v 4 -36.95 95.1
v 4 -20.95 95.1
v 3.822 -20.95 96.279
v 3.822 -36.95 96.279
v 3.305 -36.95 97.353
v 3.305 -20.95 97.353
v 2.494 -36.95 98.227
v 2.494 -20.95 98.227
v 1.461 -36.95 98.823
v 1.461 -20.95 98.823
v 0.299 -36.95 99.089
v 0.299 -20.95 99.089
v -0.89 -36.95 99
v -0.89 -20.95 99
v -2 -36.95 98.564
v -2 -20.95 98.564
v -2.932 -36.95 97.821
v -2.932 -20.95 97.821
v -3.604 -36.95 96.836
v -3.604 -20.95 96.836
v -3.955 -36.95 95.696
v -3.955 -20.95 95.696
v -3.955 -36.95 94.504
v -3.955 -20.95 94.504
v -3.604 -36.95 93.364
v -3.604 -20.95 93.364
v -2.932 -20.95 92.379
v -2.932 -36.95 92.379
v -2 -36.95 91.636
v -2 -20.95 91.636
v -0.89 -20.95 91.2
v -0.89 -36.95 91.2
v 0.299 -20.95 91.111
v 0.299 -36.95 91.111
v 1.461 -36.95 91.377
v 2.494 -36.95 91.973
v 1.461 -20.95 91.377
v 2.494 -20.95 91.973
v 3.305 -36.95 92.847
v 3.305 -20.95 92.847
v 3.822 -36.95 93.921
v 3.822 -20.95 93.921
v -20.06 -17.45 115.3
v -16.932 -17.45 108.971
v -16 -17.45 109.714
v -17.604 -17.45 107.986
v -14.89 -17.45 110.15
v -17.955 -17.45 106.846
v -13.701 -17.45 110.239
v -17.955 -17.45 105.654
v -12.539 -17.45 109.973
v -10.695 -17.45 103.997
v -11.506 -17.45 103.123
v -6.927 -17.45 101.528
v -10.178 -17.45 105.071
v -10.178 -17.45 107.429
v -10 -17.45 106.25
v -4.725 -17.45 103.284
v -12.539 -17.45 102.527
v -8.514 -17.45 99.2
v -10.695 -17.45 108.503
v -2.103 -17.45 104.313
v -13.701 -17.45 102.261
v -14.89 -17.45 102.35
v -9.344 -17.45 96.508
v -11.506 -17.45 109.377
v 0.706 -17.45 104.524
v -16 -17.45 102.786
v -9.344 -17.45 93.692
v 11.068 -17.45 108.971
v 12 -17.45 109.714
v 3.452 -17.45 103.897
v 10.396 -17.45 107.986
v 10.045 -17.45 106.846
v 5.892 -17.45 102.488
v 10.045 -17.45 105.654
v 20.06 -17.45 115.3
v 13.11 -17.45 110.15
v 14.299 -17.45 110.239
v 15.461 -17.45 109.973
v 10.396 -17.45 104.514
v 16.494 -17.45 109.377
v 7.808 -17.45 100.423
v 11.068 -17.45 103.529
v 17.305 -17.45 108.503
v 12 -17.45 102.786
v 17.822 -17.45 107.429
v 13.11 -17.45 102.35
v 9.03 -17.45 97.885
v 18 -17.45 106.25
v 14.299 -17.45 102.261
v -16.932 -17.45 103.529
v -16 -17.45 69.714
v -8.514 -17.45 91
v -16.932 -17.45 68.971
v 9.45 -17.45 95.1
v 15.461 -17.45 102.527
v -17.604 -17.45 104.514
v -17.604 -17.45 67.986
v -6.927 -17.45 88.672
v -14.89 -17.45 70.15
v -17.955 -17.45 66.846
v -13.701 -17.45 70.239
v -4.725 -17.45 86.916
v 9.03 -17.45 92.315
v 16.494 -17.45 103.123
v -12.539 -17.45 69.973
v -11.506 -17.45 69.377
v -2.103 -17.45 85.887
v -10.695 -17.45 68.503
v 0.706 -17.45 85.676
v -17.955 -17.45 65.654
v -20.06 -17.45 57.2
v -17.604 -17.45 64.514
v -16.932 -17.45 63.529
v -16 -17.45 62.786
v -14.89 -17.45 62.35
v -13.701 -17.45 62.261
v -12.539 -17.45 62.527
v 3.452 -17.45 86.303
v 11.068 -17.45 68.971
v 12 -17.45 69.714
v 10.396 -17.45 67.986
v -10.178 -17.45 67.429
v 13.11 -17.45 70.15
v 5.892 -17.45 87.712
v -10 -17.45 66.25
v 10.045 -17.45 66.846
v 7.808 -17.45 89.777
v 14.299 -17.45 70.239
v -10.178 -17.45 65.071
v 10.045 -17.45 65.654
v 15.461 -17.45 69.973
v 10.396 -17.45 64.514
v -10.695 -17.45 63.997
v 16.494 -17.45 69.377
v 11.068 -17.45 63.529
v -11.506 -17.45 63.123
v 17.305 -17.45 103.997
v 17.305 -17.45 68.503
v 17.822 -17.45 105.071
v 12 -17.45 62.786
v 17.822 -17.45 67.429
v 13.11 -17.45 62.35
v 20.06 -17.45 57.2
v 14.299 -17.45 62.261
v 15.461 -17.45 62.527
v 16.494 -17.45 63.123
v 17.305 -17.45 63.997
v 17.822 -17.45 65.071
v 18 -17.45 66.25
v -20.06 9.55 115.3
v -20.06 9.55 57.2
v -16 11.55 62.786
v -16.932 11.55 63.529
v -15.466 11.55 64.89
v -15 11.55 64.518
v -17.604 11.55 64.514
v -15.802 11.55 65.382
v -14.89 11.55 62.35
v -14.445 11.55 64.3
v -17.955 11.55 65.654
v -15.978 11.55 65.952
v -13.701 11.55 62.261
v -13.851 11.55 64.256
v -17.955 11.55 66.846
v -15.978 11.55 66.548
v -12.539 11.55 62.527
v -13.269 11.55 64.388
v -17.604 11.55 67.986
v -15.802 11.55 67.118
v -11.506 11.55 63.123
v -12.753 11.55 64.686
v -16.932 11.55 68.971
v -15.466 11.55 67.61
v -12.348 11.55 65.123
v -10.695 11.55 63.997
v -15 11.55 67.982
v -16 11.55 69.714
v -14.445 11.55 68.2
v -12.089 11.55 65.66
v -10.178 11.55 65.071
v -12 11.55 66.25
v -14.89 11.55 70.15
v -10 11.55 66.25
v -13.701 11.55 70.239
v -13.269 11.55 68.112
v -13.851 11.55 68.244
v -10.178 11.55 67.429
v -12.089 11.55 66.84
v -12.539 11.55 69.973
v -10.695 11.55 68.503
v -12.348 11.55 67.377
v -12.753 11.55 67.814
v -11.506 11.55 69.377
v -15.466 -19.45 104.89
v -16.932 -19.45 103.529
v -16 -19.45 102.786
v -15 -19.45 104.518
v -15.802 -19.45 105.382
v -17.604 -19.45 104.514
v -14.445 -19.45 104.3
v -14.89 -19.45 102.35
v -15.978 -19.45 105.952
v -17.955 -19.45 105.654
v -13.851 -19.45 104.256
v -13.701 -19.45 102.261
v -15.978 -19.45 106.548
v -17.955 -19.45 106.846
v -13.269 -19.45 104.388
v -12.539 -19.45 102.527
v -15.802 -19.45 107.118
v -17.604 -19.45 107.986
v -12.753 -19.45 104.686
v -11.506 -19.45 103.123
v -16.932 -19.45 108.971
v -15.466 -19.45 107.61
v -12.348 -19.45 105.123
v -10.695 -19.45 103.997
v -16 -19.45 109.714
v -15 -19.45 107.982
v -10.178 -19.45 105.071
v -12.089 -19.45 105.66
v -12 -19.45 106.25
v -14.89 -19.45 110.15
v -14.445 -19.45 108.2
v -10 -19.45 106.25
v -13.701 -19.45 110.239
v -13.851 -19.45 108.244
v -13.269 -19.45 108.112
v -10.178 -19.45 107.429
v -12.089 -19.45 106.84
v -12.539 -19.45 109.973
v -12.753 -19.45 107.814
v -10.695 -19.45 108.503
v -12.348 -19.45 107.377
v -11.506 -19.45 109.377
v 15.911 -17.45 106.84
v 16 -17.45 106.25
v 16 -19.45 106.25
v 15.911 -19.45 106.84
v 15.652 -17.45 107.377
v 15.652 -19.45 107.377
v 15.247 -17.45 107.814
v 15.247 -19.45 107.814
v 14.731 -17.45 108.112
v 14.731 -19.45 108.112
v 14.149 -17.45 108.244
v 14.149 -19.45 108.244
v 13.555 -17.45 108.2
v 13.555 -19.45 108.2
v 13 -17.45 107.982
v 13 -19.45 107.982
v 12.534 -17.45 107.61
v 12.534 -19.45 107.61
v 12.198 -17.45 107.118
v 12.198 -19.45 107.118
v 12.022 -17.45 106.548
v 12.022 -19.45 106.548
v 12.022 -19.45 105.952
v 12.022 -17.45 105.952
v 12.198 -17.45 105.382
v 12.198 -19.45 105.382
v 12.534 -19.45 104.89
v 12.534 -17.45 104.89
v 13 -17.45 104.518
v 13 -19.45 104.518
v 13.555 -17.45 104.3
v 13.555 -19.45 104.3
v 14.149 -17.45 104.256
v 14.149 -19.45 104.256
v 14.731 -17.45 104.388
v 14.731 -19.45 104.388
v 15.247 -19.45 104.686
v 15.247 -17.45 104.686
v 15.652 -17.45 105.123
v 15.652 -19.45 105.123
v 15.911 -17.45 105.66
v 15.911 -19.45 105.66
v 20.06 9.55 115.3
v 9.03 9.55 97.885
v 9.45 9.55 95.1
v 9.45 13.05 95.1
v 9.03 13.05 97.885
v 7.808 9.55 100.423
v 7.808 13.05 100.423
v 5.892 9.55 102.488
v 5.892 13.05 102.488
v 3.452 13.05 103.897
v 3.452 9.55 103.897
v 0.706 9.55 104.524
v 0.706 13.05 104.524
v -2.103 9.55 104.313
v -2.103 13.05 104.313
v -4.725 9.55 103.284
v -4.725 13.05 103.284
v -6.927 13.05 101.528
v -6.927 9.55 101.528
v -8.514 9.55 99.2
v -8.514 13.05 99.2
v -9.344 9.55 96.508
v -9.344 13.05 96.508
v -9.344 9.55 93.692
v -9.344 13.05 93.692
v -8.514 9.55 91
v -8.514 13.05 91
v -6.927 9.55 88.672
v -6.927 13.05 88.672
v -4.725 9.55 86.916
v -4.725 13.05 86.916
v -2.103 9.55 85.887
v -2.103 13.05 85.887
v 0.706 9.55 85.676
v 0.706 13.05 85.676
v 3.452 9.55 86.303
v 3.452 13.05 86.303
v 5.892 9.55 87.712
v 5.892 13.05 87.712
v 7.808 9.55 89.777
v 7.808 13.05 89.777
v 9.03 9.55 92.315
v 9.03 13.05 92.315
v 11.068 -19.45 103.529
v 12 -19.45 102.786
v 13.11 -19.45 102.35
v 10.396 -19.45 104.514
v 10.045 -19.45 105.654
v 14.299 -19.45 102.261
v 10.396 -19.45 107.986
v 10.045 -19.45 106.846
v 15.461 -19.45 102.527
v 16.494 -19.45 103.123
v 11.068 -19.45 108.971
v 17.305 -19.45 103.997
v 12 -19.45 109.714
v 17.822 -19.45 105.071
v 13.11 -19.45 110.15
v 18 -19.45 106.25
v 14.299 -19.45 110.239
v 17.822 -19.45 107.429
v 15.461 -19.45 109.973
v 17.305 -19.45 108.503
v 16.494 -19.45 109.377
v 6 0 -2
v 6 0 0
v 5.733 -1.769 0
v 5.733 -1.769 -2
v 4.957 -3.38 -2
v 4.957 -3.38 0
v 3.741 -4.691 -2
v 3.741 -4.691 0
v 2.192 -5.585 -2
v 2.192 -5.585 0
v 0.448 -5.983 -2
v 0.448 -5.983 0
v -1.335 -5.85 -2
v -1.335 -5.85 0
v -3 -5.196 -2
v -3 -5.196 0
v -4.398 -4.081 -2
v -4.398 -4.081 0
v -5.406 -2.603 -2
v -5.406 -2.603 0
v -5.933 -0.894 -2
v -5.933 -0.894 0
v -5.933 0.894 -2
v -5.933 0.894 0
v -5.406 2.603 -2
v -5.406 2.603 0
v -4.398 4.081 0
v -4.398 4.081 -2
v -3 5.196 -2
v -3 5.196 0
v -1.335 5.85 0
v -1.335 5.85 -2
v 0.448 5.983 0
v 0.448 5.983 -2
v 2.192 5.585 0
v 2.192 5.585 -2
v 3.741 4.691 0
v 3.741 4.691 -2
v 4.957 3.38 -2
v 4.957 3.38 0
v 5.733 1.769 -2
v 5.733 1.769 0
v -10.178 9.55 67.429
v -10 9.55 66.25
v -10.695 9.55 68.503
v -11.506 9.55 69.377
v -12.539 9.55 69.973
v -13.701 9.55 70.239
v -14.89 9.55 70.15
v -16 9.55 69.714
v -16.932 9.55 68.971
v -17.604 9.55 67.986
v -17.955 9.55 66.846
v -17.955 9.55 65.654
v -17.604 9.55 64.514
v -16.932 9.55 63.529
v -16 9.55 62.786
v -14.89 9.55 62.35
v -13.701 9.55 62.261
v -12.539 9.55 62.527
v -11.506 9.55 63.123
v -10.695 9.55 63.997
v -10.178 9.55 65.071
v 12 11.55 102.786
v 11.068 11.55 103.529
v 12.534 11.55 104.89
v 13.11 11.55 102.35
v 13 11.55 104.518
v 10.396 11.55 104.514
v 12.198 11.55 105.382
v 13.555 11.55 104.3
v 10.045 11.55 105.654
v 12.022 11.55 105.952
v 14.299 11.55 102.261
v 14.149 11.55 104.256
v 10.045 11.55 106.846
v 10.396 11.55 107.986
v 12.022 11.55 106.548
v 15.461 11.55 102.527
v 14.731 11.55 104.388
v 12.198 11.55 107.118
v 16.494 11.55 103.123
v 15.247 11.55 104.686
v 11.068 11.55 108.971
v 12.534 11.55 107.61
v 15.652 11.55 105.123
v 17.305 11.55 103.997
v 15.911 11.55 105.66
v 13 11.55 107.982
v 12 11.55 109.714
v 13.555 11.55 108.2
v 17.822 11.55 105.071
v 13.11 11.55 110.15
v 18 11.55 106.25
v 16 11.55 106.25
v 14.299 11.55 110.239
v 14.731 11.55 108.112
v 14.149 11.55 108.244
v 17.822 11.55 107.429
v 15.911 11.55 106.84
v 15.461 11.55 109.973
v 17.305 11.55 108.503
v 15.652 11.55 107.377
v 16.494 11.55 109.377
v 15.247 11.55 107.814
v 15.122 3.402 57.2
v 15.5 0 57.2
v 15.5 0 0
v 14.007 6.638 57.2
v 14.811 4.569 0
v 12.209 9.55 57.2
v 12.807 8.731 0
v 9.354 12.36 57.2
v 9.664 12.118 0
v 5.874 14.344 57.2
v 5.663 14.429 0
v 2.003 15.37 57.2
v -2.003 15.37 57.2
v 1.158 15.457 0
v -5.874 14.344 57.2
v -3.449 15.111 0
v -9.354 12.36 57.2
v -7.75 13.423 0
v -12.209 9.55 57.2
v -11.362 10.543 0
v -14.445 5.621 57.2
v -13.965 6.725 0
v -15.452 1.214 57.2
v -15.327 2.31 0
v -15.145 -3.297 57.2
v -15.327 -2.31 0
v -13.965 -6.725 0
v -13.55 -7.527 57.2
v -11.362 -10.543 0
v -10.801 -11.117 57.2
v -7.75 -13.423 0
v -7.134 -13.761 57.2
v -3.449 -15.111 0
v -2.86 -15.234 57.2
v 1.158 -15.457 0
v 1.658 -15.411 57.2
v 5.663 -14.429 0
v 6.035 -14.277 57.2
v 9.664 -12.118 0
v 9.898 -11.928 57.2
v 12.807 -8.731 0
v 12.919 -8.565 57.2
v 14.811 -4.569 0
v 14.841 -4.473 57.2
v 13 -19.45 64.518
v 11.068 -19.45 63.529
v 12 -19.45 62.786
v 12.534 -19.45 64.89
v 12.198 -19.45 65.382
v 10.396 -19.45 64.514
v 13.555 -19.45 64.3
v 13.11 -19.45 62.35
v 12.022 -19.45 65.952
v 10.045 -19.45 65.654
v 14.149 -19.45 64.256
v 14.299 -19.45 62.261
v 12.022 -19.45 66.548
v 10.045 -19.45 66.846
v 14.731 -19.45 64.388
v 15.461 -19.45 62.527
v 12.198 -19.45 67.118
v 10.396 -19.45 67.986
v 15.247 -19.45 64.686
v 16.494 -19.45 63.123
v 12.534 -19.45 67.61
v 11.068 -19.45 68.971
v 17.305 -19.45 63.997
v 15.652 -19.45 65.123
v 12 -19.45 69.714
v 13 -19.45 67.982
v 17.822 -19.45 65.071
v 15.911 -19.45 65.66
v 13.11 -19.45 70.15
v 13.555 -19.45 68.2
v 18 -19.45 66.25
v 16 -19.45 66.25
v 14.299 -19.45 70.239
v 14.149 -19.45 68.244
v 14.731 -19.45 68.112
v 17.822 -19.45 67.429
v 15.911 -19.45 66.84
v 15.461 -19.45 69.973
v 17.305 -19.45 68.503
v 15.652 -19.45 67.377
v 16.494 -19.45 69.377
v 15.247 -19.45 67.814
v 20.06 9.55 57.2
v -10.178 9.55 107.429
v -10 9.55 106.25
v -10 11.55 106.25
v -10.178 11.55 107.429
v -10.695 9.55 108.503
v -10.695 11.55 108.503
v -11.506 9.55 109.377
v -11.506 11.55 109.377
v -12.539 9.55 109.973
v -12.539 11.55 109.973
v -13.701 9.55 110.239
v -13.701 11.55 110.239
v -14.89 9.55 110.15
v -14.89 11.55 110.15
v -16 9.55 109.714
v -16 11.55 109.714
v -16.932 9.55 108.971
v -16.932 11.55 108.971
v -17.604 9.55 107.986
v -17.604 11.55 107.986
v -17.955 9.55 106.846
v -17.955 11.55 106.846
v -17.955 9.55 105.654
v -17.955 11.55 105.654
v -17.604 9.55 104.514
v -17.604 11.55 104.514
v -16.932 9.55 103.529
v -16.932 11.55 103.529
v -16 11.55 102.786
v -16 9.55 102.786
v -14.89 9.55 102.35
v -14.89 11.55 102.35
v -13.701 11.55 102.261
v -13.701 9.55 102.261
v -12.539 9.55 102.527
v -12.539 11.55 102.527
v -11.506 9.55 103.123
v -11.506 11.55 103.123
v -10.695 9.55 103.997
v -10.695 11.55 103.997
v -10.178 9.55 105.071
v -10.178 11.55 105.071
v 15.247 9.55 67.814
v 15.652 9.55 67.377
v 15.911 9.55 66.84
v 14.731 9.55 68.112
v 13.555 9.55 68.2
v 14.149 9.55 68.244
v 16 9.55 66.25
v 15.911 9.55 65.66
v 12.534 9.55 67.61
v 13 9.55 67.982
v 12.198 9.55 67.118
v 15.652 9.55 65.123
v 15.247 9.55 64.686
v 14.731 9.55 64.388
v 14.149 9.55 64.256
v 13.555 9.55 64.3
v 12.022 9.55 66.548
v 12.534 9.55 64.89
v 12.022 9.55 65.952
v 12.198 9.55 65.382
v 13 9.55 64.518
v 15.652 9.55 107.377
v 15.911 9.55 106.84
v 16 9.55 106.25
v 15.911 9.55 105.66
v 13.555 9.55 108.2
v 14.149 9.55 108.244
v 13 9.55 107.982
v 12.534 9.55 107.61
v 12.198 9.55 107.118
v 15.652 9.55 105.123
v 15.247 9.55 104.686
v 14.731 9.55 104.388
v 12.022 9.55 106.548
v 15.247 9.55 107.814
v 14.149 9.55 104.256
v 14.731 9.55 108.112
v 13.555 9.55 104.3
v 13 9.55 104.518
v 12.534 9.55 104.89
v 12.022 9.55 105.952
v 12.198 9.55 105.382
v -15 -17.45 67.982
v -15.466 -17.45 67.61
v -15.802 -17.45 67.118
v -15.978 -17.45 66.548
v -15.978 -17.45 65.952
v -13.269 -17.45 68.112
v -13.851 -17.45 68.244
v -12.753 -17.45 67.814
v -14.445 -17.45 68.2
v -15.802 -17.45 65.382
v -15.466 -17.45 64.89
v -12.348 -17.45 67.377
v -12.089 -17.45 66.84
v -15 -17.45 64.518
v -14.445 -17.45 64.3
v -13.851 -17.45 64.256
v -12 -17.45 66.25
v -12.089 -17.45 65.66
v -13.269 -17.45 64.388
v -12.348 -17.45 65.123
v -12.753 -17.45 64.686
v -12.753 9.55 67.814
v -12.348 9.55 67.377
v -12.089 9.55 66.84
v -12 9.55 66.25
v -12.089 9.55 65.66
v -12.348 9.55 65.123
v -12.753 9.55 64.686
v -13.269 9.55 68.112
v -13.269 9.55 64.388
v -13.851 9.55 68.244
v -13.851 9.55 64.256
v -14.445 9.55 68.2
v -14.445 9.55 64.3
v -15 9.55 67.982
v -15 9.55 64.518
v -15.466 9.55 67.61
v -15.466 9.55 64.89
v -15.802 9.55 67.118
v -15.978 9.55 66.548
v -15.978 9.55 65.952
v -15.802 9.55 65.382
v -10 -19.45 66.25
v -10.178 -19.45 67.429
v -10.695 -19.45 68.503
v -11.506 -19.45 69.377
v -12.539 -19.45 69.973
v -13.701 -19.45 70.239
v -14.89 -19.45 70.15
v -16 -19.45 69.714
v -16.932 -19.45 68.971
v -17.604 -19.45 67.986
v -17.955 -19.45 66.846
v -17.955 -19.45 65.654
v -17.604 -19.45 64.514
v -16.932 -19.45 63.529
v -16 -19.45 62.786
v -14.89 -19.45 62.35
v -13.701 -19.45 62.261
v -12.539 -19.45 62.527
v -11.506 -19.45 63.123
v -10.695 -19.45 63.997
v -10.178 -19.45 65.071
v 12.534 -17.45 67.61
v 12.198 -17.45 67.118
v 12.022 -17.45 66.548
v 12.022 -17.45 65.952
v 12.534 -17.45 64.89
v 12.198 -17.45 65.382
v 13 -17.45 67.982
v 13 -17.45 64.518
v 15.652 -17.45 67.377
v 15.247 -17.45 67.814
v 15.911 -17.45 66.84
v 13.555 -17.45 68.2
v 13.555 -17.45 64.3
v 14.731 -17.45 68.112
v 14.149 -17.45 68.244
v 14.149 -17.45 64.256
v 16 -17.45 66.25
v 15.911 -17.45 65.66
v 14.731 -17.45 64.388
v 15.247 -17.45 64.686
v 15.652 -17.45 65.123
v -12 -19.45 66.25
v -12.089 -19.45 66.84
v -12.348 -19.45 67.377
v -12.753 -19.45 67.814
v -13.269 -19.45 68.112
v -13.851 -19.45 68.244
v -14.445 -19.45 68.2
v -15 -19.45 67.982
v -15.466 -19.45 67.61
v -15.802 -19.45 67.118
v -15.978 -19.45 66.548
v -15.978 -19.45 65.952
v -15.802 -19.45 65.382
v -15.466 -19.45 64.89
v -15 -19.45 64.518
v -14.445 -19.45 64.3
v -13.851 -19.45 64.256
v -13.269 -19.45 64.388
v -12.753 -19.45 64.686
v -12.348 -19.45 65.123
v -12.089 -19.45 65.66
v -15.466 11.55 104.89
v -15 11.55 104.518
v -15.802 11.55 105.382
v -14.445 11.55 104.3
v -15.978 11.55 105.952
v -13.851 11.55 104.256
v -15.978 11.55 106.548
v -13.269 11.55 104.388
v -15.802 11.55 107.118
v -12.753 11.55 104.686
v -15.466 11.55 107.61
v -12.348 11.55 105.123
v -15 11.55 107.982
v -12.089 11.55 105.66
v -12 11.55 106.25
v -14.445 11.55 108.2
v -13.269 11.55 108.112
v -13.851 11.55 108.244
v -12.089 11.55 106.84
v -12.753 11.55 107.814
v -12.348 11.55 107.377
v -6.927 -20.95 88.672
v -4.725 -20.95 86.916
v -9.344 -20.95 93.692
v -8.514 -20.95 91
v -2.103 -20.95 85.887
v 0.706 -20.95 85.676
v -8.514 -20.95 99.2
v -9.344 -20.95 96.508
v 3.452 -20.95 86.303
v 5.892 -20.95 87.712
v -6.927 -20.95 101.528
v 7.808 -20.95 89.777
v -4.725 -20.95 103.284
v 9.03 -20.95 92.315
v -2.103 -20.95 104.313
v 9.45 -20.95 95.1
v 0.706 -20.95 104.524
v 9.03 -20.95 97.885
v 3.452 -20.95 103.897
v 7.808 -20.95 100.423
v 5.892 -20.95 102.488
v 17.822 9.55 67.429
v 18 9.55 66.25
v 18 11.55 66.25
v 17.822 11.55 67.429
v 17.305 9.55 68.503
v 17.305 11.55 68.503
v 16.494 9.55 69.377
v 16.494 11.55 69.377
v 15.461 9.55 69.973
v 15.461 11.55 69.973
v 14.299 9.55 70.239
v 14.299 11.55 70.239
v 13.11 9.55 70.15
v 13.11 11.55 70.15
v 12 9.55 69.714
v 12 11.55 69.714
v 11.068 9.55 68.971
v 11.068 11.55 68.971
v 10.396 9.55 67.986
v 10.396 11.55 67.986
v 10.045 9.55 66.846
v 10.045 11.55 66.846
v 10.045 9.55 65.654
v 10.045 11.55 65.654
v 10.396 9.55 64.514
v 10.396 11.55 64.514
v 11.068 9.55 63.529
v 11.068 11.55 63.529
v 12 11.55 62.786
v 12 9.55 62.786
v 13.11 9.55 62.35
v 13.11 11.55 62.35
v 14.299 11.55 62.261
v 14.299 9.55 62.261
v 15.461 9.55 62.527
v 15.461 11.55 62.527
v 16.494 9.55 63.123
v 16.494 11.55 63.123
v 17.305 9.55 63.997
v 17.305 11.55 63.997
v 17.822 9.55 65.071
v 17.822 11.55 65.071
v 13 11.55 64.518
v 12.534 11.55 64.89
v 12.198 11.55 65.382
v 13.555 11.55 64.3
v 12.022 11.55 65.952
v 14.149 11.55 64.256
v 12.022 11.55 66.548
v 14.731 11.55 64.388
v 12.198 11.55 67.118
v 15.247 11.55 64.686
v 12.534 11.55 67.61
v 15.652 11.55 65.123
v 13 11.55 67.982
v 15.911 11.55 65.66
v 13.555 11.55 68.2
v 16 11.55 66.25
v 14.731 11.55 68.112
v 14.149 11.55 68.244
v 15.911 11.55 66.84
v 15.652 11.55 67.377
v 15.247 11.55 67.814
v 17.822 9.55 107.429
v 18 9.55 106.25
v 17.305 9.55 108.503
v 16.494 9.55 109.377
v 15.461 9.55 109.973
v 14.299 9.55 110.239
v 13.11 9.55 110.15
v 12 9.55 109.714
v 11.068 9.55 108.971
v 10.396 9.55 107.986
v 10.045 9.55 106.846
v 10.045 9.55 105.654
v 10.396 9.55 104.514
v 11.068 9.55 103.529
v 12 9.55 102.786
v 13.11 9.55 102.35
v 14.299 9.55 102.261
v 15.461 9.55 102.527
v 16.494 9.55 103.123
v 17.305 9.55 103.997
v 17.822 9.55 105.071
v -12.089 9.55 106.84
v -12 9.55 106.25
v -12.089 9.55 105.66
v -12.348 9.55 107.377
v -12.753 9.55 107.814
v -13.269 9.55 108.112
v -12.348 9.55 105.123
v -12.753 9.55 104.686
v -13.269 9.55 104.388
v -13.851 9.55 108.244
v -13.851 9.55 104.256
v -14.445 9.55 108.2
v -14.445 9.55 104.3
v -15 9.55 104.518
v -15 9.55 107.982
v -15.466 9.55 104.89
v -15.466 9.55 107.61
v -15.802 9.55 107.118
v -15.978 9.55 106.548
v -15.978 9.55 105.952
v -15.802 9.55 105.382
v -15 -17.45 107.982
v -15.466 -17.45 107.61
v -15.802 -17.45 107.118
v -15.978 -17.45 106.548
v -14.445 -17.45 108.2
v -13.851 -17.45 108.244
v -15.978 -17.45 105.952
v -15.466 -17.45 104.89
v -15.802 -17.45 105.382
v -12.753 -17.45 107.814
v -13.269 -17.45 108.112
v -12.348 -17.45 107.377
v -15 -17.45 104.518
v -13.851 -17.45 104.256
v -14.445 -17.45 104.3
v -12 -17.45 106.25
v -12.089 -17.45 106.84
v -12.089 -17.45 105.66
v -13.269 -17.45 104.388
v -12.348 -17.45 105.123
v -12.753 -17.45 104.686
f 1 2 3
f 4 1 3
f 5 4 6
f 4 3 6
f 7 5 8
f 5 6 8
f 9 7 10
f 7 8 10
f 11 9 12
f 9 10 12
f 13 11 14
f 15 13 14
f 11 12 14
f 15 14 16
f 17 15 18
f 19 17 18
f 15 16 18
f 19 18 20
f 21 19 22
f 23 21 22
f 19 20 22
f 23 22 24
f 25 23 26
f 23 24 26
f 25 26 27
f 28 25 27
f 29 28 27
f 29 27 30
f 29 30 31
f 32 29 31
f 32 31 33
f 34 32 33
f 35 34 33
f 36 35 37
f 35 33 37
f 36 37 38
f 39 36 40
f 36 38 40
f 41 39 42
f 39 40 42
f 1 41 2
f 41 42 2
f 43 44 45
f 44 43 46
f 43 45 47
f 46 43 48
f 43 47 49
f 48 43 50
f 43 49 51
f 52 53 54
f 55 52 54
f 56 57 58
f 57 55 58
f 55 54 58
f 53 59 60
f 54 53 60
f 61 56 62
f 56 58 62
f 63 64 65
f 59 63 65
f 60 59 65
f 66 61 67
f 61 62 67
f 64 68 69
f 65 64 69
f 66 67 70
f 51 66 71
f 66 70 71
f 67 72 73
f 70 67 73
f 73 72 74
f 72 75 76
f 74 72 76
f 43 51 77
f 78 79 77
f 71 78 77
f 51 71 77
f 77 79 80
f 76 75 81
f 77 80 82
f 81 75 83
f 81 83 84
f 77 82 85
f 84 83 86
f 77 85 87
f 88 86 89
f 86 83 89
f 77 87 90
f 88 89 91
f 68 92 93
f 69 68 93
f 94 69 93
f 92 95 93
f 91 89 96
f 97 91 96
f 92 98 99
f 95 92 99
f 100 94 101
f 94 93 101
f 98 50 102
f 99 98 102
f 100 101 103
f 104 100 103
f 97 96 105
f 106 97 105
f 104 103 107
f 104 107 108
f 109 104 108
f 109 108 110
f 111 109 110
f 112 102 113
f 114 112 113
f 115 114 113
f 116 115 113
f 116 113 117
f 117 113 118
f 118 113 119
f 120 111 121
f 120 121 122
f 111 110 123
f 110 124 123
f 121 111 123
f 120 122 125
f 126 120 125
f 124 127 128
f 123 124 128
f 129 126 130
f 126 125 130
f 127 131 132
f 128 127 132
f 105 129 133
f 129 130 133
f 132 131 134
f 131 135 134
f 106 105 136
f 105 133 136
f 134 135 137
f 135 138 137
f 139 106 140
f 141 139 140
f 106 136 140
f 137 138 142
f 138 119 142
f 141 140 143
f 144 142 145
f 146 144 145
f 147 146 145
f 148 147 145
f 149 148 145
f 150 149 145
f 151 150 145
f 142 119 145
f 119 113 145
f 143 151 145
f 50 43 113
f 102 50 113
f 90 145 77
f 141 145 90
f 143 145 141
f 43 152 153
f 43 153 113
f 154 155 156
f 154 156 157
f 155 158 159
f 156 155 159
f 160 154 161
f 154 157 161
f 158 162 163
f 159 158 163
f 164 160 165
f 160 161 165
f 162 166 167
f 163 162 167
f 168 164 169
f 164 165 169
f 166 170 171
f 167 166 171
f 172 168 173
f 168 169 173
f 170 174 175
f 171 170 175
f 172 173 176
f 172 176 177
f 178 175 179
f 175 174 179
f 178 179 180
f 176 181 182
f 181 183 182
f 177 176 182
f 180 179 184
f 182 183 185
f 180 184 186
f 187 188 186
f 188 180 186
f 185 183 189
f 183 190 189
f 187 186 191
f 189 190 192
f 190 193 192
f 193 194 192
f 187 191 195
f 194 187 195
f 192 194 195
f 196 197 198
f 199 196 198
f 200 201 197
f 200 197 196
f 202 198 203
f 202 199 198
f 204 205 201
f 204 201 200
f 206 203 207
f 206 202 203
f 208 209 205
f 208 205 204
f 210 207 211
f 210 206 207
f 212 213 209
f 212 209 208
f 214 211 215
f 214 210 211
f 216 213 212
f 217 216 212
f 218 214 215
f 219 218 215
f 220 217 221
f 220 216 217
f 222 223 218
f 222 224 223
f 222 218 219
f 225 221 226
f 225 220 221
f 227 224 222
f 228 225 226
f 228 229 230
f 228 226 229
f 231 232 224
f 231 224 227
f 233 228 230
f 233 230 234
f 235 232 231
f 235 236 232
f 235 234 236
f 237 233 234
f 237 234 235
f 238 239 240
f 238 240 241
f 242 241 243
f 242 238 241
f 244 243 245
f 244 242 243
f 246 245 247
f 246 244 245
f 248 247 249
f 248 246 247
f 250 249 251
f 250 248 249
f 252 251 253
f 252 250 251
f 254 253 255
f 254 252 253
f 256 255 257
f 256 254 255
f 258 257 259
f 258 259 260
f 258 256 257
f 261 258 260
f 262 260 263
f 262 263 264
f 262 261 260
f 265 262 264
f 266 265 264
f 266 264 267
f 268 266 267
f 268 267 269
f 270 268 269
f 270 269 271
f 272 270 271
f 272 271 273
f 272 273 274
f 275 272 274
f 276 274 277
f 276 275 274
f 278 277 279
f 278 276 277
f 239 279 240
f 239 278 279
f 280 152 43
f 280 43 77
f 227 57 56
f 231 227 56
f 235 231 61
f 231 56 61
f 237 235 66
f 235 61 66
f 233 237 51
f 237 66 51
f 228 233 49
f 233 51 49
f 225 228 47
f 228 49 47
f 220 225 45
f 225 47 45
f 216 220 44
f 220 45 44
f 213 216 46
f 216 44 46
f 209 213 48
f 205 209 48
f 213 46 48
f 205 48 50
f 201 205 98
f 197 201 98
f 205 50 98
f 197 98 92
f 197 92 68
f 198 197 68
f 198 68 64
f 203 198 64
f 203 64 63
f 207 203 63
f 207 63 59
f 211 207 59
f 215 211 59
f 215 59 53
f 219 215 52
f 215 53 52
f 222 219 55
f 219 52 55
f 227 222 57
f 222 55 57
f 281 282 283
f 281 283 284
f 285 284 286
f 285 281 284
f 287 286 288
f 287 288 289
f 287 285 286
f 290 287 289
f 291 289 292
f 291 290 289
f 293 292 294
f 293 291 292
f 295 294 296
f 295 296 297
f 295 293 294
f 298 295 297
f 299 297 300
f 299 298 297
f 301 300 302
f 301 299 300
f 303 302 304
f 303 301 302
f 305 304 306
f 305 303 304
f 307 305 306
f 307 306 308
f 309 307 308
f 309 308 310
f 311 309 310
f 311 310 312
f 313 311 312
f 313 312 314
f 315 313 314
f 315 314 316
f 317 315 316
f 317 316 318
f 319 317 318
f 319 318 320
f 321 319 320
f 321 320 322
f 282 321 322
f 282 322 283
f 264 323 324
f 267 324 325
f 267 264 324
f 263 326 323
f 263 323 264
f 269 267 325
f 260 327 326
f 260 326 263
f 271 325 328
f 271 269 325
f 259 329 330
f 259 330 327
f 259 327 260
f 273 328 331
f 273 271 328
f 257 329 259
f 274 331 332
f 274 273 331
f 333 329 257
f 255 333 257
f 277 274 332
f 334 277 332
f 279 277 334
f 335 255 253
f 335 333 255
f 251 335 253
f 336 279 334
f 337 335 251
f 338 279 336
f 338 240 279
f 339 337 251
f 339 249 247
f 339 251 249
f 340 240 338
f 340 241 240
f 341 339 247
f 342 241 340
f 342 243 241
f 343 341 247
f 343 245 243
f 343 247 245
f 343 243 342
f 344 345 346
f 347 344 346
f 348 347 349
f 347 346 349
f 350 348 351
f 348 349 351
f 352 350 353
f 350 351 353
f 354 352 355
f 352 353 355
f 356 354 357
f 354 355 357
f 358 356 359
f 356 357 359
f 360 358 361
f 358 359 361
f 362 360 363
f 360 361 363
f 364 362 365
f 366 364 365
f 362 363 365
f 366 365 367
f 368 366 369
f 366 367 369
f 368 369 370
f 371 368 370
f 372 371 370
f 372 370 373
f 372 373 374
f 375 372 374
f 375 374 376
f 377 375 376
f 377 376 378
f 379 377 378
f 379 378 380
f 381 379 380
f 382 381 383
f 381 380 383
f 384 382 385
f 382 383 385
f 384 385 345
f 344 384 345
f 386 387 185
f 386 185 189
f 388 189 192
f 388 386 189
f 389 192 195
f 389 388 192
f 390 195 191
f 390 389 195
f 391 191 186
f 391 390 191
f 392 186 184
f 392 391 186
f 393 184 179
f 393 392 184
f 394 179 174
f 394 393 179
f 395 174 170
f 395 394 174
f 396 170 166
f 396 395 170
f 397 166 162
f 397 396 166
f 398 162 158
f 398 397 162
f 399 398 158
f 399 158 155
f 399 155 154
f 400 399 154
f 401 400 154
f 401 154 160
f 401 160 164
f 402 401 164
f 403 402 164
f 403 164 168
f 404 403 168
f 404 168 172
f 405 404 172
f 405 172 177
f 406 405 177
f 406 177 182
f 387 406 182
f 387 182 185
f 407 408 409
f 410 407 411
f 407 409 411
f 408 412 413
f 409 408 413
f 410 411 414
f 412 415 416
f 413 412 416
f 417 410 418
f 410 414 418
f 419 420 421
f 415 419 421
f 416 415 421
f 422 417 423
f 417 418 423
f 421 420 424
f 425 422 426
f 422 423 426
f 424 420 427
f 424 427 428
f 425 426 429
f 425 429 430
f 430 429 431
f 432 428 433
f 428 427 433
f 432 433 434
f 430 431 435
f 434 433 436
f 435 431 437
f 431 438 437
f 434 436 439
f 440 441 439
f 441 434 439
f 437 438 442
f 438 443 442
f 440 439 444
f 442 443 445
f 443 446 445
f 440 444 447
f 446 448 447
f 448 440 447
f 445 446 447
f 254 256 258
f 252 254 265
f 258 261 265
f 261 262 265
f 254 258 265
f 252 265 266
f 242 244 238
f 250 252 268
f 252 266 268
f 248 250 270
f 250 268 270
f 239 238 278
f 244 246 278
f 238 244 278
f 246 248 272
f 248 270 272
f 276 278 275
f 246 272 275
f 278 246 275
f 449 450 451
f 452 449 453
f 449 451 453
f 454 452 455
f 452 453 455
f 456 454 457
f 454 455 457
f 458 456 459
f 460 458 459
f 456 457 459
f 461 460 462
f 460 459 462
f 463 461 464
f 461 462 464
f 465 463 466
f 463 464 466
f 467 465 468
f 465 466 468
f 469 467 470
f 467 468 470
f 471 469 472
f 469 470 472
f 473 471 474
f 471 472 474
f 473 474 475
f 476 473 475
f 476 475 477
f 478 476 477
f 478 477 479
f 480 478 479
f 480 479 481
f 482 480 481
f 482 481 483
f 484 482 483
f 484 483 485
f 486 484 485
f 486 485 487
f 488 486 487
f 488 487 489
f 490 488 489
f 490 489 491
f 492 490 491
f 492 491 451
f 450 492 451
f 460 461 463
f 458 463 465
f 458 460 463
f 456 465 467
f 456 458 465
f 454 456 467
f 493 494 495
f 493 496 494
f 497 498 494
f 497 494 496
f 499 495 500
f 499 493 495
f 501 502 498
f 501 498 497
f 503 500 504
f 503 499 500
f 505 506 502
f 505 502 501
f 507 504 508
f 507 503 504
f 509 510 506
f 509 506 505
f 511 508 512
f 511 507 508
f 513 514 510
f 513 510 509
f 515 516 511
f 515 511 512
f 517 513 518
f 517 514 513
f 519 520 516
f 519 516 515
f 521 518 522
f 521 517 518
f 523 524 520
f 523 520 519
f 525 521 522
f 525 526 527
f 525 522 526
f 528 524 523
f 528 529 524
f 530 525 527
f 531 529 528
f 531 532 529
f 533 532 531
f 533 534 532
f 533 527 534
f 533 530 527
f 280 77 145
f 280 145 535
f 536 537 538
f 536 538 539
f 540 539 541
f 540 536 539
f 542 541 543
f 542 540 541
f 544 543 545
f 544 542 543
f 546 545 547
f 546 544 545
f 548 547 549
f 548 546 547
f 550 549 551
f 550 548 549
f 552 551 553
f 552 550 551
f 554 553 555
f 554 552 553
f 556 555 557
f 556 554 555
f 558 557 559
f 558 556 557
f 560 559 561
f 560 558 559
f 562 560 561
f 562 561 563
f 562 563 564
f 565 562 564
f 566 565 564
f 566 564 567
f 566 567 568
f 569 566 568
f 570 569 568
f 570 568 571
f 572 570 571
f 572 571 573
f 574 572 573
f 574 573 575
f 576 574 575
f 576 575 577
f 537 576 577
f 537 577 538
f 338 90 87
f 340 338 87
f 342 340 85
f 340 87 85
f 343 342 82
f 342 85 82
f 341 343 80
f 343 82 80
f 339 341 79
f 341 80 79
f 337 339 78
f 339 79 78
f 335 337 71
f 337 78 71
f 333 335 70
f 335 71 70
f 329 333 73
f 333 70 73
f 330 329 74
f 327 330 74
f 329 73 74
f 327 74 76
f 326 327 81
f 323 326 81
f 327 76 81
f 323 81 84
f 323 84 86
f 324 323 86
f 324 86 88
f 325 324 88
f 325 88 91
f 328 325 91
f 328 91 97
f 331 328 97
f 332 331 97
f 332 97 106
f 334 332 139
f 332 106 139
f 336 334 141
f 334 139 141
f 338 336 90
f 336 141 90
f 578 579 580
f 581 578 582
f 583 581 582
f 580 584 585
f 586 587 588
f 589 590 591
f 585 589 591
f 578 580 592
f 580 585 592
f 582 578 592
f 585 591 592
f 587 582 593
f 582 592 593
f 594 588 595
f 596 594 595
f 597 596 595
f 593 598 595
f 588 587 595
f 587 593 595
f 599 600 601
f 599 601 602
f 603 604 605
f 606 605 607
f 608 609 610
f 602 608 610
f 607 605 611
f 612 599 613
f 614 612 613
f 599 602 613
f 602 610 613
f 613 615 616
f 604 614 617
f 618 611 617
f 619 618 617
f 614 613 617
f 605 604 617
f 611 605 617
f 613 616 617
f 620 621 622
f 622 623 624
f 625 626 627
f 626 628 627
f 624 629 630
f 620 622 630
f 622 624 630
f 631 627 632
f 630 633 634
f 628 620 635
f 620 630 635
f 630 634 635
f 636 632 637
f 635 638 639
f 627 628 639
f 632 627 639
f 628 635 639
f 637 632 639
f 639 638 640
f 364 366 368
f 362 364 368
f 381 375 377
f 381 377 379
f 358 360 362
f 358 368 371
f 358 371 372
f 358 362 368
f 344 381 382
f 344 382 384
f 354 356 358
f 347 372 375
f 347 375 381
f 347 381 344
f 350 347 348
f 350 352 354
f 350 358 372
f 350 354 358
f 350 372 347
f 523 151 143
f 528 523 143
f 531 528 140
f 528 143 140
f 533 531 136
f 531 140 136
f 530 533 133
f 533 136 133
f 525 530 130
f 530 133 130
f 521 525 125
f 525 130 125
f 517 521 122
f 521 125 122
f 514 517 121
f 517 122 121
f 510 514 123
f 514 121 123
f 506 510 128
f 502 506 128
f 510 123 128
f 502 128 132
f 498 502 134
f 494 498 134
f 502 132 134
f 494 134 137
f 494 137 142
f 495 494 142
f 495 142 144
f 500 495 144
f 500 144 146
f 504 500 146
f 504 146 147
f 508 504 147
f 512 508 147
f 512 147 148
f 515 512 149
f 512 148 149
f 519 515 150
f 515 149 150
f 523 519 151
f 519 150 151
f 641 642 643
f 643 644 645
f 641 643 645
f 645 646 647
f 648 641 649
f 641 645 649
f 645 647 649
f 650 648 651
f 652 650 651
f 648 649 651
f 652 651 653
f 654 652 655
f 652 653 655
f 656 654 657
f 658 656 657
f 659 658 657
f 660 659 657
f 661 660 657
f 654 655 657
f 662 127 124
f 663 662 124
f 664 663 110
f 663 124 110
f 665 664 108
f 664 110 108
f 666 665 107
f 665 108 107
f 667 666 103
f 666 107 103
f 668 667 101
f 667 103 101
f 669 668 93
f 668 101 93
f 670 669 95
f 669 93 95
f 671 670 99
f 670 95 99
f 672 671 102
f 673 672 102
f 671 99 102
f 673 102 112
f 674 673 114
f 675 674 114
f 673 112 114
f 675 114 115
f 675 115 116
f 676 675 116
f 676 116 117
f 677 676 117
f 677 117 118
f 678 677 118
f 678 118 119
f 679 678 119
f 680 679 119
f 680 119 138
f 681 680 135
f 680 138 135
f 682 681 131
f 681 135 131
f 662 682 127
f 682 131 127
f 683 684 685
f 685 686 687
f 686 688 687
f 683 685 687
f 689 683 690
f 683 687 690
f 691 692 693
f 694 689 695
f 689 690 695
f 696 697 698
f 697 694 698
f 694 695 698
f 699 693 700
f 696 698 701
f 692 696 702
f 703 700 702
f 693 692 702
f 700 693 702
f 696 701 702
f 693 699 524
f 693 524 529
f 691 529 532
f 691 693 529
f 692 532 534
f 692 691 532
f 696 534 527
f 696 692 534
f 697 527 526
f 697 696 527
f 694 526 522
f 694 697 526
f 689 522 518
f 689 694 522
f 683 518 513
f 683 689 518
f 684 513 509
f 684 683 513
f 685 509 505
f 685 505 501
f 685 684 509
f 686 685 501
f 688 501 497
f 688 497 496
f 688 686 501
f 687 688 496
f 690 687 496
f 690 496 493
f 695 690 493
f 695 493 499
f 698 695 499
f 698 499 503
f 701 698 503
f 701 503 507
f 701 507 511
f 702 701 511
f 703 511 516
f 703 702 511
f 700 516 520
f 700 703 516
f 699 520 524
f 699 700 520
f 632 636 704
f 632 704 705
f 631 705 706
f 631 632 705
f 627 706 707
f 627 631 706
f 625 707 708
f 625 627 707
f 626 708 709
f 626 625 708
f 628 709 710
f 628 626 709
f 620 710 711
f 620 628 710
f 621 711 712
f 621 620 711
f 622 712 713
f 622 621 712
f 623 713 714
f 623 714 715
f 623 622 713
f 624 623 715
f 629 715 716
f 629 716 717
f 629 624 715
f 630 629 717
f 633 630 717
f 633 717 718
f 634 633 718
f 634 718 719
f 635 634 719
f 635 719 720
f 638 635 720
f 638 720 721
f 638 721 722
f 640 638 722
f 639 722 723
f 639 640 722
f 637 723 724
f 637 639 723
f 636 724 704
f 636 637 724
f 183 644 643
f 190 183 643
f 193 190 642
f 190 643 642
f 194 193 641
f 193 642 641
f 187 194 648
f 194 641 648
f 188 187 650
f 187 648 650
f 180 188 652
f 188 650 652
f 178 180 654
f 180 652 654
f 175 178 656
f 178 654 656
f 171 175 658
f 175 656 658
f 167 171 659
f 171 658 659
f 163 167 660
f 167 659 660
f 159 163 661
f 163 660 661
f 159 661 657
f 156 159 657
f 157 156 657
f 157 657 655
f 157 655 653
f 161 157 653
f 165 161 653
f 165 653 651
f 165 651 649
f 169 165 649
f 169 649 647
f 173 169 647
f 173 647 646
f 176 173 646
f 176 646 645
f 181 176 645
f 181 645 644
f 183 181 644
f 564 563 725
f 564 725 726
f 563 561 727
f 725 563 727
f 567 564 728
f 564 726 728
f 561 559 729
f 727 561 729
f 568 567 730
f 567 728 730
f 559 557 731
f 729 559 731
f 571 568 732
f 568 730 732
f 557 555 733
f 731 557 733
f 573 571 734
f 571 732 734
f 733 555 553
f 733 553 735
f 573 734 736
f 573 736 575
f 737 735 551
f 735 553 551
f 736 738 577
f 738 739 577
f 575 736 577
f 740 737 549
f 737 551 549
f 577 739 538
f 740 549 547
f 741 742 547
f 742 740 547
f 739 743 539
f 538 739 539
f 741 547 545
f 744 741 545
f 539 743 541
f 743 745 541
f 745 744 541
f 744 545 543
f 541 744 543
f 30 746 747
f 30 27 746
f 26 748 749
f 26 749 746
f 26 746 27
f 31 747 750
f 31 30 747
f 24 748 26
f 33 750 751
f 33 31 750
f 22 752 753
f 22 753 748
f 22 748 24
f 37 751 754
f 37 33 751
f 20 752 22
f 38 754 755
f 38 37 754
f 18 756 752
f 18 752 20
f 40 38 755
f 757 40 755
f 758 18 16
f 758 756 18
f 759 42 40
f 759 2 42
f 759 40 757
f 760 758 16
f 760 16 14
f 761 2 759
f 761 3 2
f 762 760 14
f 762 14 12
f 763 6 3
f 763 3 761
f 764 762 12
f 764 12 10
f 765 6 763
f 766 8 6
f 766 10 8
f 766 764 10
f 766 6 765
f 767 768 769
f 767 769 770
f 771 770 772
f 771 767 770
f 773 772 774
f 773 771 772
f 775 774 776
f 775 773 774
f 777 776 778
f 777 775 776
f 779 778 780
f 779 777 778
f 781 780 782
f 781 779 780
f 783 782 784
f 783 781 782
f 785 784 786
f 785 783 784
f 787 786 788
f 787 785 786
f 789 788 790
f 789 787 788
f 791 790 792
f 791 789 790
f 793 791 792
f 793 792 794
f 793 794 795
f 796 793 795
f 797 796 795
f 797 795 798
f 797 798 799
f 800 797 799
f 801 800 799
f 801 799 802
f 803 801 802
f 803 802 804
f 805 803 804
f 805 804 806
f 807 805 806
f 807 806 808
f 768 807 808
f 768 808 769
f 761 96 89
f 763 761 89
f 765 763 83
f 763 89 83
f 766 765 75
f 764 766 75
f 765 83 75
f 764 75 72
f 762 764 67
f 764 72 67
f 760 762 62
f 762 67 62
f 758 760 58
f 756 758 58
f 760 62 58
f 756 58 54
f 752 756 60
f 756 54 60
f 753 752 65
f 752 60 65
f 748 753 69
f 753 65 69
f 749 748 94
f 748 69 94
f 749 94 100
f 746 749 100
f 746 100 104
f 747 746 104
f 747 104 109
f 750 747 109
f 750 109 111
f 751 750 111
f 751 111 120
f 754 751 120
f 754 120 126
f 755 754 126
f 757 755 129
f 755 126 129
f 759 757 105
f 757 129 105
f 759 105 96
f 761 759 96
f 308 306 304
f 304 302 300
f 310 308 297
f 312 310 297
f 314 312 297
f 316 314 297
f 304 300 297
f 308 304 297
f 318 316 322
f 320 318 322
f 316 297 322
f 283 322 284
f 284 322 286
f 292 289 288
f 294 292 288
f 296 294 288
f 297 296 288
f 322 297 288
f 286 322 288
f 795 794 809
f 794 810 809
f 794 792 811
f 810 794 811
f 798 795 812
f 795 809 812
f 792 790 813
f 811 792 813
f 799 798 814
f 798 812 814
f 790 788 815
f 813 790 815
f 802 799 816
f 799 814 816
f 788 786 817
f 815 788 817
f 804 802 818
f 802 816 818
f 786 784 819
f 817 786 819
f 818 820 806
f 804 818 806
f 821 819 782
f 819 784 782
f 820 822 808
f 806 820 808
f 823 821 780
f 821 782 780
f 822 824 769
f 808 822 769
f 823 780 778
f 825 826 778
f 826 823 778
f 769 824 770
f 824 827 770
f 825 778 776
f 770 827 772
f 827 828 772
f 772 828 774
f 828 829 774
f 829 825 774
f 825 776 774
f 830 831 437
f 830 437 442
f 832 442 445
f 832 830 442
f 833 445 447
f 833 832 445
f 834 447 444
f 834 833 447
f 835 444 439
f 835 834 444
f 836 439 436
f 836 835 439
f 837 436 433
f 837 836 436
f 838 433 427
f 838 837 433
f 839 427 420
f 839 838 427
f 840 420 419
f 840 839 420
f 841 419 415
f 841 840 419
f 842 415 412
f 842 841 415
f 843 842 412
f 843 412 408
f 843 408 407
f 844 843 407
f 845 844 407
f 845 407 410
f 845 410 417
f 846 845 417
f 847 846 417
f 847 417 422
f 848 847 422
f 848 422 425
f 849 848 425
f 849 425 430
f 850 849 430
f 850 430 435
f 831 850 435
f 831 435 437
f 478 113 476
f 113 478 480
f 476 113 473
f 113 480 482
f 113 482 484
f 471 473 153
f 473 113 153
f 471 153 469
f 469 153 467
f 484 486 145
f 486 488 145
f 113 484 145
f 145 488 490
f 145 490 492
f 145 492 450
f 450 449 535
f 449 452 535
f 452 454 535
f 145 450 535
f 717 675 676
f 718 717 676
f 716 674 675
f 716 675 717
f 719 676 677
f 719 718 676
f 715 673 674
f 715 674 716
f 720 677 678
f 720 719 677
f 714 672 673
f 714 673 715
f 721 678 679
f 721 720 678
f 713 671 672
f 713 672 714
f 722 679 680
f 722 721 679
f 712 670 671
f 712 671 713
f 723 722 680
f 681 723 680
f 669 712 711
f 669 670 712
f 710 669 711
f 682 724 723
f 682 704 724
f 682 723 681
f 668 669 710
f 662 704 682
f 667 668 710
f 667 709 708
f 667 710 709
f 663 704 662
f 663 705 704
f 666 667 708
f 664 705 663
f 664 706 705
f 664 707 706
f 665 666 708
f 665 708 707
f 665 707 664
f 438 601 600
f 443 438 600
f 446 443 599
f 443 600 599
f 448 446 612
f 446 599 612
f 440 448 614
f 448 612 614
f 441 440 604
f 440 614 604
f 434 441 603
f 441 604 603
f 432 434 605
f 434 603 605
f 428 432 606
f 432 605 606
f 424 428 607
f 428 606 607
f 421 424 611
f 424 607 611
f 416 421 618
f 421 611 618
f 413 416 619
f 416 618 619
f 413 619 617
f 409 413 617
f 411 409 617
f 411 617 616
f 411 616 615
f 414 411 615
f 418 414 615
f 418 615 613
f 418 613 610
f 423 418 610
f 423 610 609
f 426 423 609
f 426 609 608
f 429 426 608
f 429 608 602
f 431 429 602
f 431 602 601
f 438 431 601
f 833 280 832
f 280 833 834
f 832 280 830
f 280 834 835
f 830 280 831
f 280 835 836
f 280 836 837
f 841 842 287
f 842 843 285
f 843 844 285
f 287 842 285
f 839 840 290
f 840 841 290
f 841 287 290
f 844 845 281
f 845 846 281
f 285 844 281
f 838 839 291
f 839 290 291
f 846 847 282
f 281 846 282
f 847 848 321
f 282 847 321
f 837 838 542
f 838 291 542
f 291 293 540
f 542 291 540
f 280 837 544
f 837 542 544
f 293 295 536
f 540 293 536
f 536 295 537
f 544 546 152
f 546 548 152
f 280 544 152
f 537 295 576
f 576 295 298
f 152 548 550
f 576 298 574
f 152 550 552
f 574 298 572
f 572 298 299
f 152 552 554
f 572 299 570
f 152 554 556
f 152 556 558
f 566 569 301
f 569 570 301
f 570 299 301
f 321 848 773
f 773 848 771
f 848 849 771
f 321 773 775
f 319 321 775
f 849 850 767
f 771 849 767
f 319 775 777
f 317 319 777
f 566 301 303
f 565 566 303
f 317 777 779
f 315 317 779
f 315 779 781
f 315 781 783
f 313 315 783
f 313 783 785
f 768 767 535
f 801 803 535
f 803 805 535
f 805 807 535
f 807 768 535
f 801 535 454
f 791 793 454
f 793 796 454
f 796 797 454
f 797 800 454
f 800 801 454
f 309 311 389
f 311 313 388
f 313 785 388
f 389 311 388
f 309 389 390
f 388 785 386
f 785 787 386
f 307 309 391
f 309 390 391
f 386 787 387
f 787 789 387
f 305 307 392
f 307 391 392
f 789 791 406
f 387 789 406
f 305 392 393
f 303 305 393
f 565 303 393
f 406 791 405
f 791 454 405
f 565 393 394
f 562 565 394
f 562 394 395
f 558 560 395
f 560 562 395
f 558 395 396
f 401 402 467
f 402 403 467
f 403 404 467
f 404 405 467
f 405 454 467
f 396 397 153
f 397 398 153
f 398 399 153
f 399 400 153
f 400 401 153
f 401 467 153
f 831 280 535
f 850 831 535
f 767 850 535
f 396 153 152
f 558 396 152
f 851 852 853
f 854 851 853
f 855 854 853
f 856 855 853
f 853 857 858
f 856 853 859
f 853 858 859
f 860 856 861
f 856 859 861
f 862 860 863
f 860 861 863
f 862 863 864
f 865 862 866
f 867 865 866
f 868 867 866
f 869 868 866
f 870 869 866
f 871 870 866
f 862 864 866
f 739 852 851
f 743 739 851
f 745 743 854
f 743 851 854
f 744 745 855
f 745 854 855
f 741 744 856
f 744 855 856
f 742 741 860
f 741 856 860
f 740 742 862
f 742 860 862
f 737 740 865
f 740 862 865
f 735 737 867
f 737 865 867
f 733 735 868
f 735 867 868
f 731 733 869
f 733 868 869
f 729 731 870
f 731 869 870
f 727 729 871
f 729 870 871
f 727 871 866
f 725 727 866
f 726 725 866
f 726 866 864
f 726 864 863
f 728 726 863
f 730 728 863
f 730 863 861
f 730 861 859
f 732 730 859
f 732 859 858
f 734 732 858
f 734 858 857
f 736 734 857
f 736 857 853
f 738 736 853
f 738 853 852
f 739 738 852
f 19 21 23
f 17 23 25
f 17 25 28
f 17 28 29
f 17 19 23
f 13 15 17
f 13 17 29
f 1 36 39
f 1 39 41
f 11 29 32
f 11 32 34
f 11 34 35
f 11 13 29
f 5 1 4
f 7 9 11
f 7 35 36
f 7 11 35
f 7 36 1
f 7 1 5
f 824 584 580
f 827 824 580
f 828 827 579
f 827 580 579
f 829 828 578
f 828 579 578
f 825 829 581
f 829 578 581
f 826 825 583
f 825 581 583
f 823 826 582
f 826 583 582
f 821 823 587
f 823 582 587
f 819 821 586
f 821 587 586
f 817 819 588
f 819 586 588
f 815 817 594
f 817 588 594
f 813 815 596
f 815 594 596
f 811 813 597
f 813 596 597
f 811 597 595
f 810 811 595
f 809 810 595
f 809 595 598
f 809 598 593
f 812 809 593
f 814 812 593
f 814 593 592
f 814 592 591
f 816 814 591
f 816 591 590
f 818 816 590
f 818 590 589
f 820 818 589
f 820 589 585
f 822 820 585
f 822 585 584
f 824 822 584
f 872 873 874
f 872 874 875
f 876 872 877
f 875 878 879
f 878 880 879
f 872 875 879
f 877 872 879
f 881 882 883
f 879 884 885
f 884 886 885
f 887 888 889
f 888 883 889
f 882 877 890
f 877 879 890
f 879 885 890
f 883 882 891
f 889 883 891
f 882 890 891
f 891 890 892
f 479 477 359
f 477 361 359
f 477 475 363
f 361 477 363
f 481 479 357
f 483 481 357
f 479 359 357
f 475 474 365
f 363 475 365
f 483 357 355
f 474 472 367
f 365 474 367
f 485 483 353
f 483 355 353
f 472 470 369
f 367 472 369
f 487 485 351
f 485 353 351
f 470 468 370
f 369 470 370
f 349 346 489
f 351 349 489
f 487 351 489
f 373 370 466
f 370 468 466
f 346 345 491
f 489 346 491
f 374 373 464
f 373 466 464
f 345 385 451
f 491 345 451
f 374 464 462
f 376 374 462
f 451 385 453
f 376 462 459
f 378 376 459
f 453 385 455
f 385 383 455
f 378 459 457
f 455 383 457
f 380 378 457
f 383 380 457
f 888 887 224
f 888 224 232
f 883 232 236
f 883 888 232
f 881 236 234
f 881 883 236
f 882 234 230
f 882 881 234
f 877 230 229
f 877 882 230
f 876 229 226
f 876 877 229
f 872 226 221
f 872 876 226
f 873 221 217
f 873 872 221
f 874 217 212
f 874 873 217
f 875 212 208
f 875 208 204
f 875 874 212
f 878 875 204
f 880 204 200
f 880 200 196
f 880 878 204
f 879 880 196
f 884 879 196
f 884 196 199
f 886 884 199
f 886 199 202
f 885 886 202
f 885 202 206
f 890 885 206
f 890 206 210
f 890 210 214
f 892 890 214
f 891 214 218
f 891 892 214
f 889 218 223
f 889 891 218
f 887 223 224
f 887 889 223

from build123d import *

# Parameters (mm, degrees)
F0_R      = 15.5
F1_DEPTH  = 57.2
F3_DEPTH  = 58.1
F4_R      = 9.45
F5_DEPTH  = 3.5
F5_FACE_R = 9.45
F6_DEPTH  = 34
F7_R      = 4
F8_DEPTH  = 16
F9_R      = 4
F9_R_2    = 2
F10_DEPTH = 2
F11_DEPTH = 29
F12_R     = 6
F13_DEPTH = 2


with BuildPart() as f1:
    # F0 (on Top) → F1 (new body)
    with BuildSketch(Plane.XY):
        Circle(F0_R)
    extrude(amount=F1_DEPTH)

    # F2 (on face) → F3 (join)
    with BuildSketch(Plane.XY.offset(57.2)):
        with BuildLine():
            Line((-12.208501, 9.55), (-20.06, 9.55))
            Line((-20.06, 9.55), (-20.06, -17.45))
            Line((-20.06, -17.45), (20.06, -17.45))
            Line((20.06, -17.45), (20.06, 9.55))
            Line((20.06, 9.55), (12.208501, 9.55))
            ThreePointArc((12.208501, 9.55), (14.65404, 5.050655), (15.5, 0))
            ThreePointArc((15.5, 0), (-5.050655, -14.65404), (-12.208501, 9.55))
        make_face()
        with BuildLine():
            Line((12.208501, 9.55), (-12.208501, 9.55))
            ThreePointArc((-12.208501, 9.55), (-5.050655, -14.65404), (15.5, 0))
            ThreePointArc((15.5, 0), (14.65404, 5.050655), (12.208501, 9.55))
        make_face()
    extrude(amount=F3_DEPTH)

    # F4 (on face) → F5 (join)
    with BuildSketch(Plane.XZ.offset(17.45)):
        with Locations((0, 95.1)):
            Circle(F4_R)
    extrude(amount=F5_DEPTH)

    # F5_face (on face) → F6 (join)
    with BuildSketch(Plane(origin=(0, -20.95, 95.1), x_dir=(1, 0, 0), z_dir=(0, -1, 0))):
        Circle(F5_FACE_R)
    extrude(amount=-F6_DEPTH)

    # F7 (on face) → F8 (join)
    with BuildSketch(Plane.XZ.offset(20.95)):
        with Locations((0, 95.1)):
            Circle(F7_R)
    extrude(amount=F8_DEPTH)

    # F9 (on face) → F10 (join)
    with BuildSketch(Plane.XZ.offset(17.45)):
        with Locations((14, 106.25)):
            Circle(F9_R)
        with Locations((14, 106.25)):
            Circle(F9_R_2, mode=Mode.SUBTRACT)
        with Locations((-14, 106.25)):
            Circle(F9_R)
        with Locations((-14, 106.25)):
            Circle(F9_R_2, mode=Mode.SUBTRACT)
        with Locations((14, 66.25)):
            Circle(F9_R)
        with Locations((14, 66.25)):
            Circle(F9_R_2, mode=Mode.SUBTRACT)
        with Locations((-14, 66.25)):
            Circle(F9_R)
        with Locations((-14, 66.25)):
            Circle(F9_R_2, mode=Mode.SUBTRACT)
    extrude(amount=F10_DEPTH)

    # F9 (on face) → F11 (join)
    with BuildSketch(Plane.XZ.offset(17.45)):
        with Locations((14, 106.25)):
            Circle(F9_R)
        with Locations((14, 106.25)):
            Circle(F9_R_2, mode=Mode.SUBTRACT)
        with Locations((-14, 106.25)):
            Circle(F9_R)
        with Locations((-14, 106.25)):
            Circle(F9_R_2, mode=Mode.SUBTRACT)
        with Locations((14, 66.25)):
            Circle(F9_R)
        with Locations((14, 66.25)):
            Circle(F9_R_2, mode=Mode.SUBTRACT)
        with Locations((-14, 66.25)):
            Circle(F9_R)
        with Locations((-14, 66.25)):
            Circle(F9_R_2, mode=Mode.SUBTRACT)
    extrude(amount=-F11_DEPTH)

    # F12 (on face) → F13 (join)
    with BuildSketch(Plane(origin=(0, 0, 0), x_dir=(1, 0, 0), z_dir=(0, 0, -1))):
        Circle(F12_R)
    extrude(amount=F13_DEPTH)


solid = f1.part
